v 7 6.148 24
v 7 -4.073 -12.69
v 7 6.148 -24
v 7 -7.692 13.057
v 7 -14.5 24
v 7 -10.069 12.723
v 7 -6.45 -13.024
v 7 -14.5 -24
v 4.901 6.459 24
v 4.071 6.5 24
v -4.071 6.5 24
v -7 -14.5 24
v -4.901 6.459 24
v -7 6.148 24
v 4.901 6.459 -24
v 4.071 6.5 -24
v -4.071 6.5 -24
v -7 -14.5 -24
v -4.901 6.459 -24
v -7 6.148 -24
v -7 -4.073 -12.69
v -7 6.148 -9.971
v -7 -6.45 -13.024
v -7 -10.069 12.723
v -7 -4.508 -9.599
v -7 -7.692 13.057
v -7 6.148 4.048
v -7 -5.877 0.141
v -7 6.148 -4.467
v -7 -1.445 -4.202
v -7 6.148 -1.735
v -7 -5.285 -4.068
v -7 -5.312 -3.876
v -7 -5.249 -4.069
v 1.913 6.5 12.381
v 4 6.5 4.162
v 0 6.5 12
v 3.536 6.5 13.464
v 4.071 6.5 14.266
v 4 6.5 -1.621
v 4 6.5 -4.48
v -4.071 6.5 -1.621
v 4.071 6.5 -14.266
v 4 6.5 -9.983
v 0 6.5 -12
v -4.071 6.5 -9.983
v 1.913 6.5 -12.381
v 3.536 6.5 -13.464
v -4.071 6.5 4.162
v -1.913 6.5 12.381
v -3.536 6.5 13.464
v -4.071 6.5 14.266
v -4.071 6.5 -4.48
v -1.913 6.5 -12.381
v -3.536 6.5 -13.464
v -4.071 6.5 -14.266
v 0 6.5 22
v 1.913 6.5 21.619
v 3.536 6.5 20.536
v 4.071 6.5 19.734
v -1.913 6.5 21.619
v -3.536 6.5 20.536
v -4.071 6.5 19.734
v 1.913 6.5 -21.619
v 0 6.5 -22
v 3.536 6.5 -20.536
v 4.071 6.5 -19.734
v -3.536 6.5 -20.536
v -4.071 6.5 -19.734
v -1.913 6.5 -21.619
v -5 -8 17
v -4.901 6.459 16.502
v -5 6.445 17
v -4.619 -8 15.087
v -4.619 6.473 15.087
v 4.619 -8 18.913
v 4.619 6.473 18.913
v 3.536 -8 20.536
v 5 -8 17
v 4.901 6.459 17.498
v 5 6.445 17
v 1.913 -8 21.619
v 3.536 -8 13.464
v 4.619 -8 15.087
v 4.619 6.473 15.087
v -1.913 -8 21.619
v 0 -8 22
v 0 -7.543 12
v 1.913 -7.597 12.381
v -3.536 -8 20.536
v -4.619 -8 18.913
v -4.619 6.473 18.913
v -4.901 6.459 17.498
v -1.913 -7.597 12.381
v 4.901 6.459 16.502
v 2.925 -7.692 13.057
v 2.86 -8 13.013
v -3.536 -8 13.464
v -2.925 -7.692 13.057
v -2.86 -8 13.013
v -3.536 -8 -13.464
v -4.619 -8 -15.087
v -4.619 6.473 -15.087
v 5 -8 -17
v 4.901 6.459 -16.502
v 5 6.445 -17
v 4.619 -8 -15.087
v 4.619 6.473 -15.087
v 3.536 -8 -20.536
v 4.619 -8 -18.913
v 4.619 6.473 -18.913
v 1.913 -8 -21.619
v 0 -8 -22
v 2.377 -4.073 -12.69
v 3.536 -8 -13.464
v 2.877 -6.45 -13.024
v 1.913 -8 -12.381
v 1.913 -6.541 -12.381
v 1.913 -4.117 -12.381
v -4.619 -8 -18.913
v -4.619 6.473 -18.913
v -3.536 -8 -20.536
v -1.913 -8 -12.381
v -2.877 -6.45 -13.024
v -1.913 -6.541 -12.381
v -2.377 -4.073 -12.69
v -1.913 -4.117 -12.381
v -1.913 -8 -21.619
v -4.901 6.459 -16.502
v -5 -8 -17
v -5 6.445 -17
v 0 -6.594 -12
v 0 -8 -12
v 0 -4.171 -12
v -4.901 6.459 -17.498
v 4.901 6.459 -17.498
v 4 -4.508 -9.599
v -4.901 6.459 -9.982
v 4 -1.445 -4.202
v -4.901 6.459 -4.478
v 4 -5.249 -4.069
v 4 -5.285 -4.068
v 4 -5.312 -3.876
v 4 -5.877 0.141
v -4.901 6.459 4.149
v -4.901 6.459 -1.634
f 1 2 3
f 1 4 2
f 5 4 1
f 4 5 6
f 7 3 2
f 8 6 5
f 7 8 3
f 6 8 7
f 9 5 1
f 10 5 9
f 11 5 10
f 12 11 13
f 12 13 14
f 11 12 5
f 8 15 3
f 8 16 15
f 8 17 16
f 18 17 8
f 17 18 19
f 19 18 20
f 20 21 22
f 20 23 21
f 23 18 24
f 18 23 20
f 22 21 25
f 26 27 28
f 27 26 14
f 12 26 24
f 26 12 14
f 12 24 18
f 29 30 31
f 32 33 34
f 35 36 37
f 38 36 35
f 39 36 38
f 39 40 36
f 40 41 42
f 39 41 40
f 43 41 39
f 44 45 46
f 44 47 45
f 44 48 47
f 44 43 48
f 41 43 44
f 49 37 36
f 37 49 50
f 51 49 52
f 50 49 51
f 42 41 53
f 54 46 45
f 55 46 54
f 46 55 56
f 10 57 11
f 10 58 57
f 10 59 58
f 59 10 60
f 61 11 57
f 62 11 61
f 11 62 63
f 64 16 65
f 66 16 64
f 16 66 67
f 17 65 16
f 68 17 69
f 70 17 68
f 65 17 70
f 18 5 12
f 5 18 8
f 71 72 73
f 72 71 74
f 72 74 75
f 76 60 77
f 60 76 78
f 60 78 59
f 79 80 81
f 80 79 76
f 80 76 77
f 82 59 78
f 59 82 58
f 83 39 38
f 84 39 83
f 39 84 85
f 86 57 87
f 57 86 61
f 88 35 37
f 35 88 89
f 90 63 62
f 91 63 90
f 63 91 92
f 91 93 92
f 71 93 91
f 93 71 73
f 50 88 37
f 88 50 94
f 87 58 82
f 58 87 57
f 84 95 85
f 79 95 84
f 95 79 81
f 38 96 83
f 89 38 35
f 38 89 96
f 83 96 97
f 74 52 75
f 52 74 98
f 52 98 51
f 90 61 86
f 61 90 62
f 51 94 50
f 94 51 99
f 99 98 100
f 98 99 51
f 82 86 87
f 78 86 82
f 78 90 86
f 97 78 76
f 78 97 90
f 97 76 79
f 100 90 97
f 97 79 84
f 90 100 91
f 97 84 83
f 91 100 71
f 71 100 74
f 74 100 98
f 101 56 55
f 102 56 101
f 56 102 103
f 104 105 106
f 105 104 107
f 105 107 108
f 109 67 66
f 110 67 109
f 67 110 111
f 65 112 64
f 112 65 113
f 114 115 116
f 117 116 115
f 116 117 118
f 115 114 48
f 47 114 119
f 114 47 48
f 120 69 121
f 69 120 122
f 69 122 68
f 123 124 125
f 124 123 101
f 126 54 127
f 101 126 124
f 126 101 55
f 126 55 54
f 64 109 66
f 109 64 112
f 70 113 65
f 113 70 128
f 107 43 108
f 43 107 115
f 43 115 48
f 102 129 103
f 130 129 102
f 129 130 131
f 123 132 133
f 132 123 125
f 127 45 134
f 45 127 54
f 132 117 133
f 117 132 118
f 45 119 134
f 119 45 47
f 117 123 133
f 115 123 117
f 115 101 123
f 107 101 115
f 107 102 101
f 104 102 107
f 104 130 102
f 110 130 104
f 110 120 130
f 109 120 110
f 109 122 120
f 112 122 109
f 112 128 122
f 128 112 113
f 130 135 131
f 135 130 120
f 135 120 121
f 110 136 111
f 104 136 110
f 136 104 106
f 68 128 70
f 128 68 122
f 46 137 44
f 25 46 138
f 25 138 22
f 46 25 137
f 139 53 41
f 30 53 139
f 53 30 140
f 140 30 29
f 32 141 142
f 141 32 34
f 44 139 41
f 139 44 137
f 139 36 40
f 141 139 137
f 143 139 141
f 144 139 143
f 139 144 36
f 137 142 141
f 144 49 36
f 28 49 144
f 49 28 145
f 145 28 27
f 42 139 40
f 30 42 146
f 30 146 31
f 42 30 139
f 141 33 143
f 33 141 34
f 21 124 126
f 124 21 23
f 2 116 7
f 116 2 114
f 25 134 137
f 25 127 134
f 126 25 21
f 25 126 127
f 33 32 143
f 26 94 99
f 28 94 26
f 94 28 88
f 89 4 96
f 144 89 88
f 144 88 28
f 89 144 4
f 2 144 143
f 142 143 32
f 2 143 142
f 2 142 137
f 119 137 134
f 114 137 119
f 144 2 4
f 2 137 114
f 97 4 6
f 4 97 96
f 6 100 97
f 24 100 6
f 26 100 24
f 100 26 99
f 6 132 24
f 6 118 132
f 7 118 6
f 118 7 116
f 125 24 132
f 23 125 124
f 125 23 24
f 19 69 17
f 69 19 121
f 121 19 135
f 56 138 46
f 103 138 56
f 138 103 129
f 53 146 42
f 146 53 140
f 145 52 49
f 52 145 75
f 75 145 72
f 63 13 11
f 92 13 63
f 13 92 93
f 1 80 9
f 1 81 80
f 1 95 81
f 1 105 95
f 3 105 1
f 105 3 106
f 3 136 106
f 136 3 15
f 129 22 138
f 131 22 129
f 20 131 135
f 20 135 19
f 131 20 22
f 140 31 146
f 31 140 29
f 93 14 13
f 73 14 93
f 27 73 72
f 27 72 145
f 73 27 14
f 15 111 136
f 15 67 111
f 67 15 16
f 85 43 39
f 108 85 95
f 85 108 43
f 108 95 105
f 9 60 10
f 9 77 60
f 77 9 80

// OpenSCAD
diameter=10;
height=4;
number=3;
distance=5;
baseline=30; 
nudge=3;


module maghole(diameter,height,number,back) {
		translate([0,height*(number-2)/2,0])
        rotate([90,0,0])
         cylinder(r=diameter/2,h=height*(2*number-1),center=true);
    if(back == 1) {
		translate([0,-height*2*(number+1)/2,0])
        rotate([90,0,0])
         cylinder(r=diameter/2,h=height*number,center=true);
    }
}

module smaghole(diameter,height,number,back) {
		translate([0,.15+height*(number-2)/2,0])
        rotate([90,0,0])
         cylinder(r=0.3+diameter/2,h=height*(2*number-1),center=true);
    if(back == 1) {
		translate([0,-(0.15+height*2*(number+1)/2),0])
        rotate([90,0,0])
         cylinder(r=0.3+diameter/2,h=height*number,center=true);
    }
}
module mirror(diameter,height,number,distance,baseline) {
width=diameter+4;
depth=distance+height*number+4;
length=baseline+diameter+8;
mirrorthick = 1.8;
   difference() {
     translate([0,-height,0])
	   cube([width,  // Small dimension
            depth, // Optical path dim
		      length],center=true);
      translate([0,0,2+baseline/2])
             maghole(diameter,height,number,0);
     translate([0,0,-(2+baseline/2)])
             maghole(diameter,height,number,0);

     rotate([-2,0,0])
     translate([-4,0.5+depth/4,-7])
          cube([width+2,depth+2,((length-2*width)/2)-4.5],center=true);

     rotate([18,0,0])
     translate([-4,depth/4,-0.8])
          cube([width+2,depth+2,((length-2*width)/2)-4.5],center=true);

    rotate([8,0,0])
     translate([0,-depth/3,1])
          cube([width+2,mirrorthick+0.6,length-(2*diameter+2)],center=true);
     }
}

module sensor(diameter,height,number,distance,baseline) {
width=diameter+4;
depth=distance+height*number+4;
length=baseline+diameter+8;
mirrorthick = 2.6;
extra=2*width+4;

   difference() {
     translate([2+width/2,-height,0])
	   cube([extra,  // Small dimension
            depth, // Optical path dim
		      length],center=true);
      translate([0,0,2+baseline/2])
             smaghole(diameter,height,number,1);
     translate([0,0,-(2+baseline/2)])
             smaghole(diameter,height,number,1);
//LASER
     translate([0,0,4])
        rotate([90,0,0])
             cylinder(r=3.2,h=40,center=true,$fn=24);
//PhotoTransistor
     translate([0,0,-2])
        rotate([90,0,0])
             cylinder(r=2,h=40,center=true,$fn=12);
// TEMP SENSOR
     translate([2+width,0,0])
        rotate([90,0,0])
             cylinder(r=4.7,h=40,center=true);

     }

     difference() {
     translate([0,-4,-2.5])cube([5,6,5],center=true);
     translate([0,-8,0])
        cylinder(r=3.2,h=10,center=true,$fn=12);
     translate([0,0,-1.2])
        rotate([90,0,0])
             cylinder(r=0.6,h=40,center=true,$fn=6);
     translate([0,0,-2.8])
        rotate([90,0,0])
             cylinder(r=0.6,h=40,center=true,$fn=6);
     }
}

module jarwall() {
  difference() {
     cube([40,40,120],center=true);
	  translate([40,0,0])
	     cylinder(r=50,h=120,center=true,$fn=64);
	   }
}

module jar() {
	  translate([-8,110,-10])
	          cylinder(r=50,h=120,center=true,$fn=64);
}

module powerhole(dim) {
offset = dim+2;
  //  cylinder(r=dim,h=2*dim,center=true,$fn=10);
  //  translate([dim-1.6,0,0])
   //   cylinder(r=dim,h=dim,center=true,$fn=10);
    translate([dim-3,0,0]) cube([2*dim+2,2*dim-1,2*dim-1],center=true);
    translate([-offset,0,0])
      cylinder(r=1.1,h=2*dim,center=true,$fn=10);
    translate([offset+2,0,0])
      cylinder(r=1.1,h=2*dim,center=true,$fn=10);
}

module sensordevice() {
  wall = 32;
  side = 44;
  deep = 50;
  difference() { 
   sensor(diameter,height,number,distance,baseline);
   translate([6,-60,3]) jar();
  }
  translate([-7,-(wall+30),21]) cube([wall,side+12,3]);

     translate([-7,-(wall+30),-24])
         cube([wall,side+12,3]);

  difference() {
  translate([23.5,-(wall+7),0])
    rotate([0,90,0])
    cube([side,deep,3],center=true);
     translate([24,-54,12])
			rotate([0,90,0]) 
           powerhole(4.5);
  }
}
module mirrordevice() {
  difference() { 
   mirror(diameter,height,number,distance,baseline);
   translate([0,-3.3,0]) rotate([0,0,-90]) jarwall();
  }
}

//rotate([0,90,180]) 
  // sensordevice();
   mirrordevice();



     
